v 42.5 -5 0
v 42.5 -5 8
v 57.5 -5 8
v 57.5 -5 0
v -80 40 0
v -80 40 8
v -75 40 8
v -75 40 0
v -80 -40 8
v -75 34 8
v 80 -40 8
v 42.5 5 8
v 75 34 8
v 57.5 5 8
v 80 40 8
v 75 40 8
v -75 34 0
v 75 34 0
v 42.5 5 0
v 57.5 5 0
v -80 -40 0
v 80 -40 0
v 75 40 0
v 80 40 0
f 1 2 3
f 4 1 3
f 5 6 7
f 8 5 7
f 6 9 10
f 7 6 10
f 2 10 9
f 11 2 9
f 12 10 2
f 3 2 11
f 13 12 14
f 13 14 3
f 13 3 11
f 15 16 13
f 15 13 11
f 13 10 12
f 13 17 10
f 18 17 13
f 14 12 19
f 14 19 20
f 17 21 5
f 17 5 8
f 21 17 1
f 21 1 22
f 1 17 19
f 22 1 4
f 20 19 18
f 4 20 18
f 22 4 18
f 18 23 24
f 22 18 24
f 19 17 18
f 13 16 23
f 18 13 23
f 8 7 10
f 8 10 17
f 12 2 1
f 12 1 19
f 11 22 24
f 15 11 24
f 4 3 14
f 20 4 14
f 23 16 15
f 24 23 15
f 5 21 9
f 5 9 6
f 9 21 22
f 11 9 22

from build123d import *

# Parameters (mm, degrees)
SKETCH_1_W          = 160
SKETCH_1_H          = 80
EXTRUDE_1_DEPTH     = 8
SKETCH_2_W          = 150
SKETCH_2_H          = 75
CUT_EXTRUDE_1_DEPTH = 6
SKETCH_3_W          = 15
SKETCH_3_H          = 10
CUT_EXTRUDE_2_DEPTH = 90.799777283


with BuildPart() as part:
    # 草图1 → 凸台-拉伸1 (new body)
    with BuildSketch(Plane.XY):
        Rectangle(SKETCH_1_W, SKETCH_1_H)
    extrude(amount=EXTRUDE_1_DEPTH)

    # 草图2 → 切除-拉伸1 (cut)
    with BuildSketch(Plane(origin=(0, 40, 0), x_dir=(1, 0, 0), z_dir=(0, 1, 0))):
        Rectangle(SKETCH_2_W, SKETCH_2_H)
    extrude(amount=-CUT_EXTRUDE_1_DEPTH, mode=Mode.SUBTRACT)

    # 草图3 → 切除-拉伸2 (cut, through all)
    with BuildSketch(Plane.XY.offset(8)):
        with Locations((50, 0)):
            Rectangle(SKETCH_3_W, SKETCH_3_H)
    extrude(amount=-CUT_EXTRUDE_2_DEPTH, mode=Mode.SUBTRACT)


solid = part.part
